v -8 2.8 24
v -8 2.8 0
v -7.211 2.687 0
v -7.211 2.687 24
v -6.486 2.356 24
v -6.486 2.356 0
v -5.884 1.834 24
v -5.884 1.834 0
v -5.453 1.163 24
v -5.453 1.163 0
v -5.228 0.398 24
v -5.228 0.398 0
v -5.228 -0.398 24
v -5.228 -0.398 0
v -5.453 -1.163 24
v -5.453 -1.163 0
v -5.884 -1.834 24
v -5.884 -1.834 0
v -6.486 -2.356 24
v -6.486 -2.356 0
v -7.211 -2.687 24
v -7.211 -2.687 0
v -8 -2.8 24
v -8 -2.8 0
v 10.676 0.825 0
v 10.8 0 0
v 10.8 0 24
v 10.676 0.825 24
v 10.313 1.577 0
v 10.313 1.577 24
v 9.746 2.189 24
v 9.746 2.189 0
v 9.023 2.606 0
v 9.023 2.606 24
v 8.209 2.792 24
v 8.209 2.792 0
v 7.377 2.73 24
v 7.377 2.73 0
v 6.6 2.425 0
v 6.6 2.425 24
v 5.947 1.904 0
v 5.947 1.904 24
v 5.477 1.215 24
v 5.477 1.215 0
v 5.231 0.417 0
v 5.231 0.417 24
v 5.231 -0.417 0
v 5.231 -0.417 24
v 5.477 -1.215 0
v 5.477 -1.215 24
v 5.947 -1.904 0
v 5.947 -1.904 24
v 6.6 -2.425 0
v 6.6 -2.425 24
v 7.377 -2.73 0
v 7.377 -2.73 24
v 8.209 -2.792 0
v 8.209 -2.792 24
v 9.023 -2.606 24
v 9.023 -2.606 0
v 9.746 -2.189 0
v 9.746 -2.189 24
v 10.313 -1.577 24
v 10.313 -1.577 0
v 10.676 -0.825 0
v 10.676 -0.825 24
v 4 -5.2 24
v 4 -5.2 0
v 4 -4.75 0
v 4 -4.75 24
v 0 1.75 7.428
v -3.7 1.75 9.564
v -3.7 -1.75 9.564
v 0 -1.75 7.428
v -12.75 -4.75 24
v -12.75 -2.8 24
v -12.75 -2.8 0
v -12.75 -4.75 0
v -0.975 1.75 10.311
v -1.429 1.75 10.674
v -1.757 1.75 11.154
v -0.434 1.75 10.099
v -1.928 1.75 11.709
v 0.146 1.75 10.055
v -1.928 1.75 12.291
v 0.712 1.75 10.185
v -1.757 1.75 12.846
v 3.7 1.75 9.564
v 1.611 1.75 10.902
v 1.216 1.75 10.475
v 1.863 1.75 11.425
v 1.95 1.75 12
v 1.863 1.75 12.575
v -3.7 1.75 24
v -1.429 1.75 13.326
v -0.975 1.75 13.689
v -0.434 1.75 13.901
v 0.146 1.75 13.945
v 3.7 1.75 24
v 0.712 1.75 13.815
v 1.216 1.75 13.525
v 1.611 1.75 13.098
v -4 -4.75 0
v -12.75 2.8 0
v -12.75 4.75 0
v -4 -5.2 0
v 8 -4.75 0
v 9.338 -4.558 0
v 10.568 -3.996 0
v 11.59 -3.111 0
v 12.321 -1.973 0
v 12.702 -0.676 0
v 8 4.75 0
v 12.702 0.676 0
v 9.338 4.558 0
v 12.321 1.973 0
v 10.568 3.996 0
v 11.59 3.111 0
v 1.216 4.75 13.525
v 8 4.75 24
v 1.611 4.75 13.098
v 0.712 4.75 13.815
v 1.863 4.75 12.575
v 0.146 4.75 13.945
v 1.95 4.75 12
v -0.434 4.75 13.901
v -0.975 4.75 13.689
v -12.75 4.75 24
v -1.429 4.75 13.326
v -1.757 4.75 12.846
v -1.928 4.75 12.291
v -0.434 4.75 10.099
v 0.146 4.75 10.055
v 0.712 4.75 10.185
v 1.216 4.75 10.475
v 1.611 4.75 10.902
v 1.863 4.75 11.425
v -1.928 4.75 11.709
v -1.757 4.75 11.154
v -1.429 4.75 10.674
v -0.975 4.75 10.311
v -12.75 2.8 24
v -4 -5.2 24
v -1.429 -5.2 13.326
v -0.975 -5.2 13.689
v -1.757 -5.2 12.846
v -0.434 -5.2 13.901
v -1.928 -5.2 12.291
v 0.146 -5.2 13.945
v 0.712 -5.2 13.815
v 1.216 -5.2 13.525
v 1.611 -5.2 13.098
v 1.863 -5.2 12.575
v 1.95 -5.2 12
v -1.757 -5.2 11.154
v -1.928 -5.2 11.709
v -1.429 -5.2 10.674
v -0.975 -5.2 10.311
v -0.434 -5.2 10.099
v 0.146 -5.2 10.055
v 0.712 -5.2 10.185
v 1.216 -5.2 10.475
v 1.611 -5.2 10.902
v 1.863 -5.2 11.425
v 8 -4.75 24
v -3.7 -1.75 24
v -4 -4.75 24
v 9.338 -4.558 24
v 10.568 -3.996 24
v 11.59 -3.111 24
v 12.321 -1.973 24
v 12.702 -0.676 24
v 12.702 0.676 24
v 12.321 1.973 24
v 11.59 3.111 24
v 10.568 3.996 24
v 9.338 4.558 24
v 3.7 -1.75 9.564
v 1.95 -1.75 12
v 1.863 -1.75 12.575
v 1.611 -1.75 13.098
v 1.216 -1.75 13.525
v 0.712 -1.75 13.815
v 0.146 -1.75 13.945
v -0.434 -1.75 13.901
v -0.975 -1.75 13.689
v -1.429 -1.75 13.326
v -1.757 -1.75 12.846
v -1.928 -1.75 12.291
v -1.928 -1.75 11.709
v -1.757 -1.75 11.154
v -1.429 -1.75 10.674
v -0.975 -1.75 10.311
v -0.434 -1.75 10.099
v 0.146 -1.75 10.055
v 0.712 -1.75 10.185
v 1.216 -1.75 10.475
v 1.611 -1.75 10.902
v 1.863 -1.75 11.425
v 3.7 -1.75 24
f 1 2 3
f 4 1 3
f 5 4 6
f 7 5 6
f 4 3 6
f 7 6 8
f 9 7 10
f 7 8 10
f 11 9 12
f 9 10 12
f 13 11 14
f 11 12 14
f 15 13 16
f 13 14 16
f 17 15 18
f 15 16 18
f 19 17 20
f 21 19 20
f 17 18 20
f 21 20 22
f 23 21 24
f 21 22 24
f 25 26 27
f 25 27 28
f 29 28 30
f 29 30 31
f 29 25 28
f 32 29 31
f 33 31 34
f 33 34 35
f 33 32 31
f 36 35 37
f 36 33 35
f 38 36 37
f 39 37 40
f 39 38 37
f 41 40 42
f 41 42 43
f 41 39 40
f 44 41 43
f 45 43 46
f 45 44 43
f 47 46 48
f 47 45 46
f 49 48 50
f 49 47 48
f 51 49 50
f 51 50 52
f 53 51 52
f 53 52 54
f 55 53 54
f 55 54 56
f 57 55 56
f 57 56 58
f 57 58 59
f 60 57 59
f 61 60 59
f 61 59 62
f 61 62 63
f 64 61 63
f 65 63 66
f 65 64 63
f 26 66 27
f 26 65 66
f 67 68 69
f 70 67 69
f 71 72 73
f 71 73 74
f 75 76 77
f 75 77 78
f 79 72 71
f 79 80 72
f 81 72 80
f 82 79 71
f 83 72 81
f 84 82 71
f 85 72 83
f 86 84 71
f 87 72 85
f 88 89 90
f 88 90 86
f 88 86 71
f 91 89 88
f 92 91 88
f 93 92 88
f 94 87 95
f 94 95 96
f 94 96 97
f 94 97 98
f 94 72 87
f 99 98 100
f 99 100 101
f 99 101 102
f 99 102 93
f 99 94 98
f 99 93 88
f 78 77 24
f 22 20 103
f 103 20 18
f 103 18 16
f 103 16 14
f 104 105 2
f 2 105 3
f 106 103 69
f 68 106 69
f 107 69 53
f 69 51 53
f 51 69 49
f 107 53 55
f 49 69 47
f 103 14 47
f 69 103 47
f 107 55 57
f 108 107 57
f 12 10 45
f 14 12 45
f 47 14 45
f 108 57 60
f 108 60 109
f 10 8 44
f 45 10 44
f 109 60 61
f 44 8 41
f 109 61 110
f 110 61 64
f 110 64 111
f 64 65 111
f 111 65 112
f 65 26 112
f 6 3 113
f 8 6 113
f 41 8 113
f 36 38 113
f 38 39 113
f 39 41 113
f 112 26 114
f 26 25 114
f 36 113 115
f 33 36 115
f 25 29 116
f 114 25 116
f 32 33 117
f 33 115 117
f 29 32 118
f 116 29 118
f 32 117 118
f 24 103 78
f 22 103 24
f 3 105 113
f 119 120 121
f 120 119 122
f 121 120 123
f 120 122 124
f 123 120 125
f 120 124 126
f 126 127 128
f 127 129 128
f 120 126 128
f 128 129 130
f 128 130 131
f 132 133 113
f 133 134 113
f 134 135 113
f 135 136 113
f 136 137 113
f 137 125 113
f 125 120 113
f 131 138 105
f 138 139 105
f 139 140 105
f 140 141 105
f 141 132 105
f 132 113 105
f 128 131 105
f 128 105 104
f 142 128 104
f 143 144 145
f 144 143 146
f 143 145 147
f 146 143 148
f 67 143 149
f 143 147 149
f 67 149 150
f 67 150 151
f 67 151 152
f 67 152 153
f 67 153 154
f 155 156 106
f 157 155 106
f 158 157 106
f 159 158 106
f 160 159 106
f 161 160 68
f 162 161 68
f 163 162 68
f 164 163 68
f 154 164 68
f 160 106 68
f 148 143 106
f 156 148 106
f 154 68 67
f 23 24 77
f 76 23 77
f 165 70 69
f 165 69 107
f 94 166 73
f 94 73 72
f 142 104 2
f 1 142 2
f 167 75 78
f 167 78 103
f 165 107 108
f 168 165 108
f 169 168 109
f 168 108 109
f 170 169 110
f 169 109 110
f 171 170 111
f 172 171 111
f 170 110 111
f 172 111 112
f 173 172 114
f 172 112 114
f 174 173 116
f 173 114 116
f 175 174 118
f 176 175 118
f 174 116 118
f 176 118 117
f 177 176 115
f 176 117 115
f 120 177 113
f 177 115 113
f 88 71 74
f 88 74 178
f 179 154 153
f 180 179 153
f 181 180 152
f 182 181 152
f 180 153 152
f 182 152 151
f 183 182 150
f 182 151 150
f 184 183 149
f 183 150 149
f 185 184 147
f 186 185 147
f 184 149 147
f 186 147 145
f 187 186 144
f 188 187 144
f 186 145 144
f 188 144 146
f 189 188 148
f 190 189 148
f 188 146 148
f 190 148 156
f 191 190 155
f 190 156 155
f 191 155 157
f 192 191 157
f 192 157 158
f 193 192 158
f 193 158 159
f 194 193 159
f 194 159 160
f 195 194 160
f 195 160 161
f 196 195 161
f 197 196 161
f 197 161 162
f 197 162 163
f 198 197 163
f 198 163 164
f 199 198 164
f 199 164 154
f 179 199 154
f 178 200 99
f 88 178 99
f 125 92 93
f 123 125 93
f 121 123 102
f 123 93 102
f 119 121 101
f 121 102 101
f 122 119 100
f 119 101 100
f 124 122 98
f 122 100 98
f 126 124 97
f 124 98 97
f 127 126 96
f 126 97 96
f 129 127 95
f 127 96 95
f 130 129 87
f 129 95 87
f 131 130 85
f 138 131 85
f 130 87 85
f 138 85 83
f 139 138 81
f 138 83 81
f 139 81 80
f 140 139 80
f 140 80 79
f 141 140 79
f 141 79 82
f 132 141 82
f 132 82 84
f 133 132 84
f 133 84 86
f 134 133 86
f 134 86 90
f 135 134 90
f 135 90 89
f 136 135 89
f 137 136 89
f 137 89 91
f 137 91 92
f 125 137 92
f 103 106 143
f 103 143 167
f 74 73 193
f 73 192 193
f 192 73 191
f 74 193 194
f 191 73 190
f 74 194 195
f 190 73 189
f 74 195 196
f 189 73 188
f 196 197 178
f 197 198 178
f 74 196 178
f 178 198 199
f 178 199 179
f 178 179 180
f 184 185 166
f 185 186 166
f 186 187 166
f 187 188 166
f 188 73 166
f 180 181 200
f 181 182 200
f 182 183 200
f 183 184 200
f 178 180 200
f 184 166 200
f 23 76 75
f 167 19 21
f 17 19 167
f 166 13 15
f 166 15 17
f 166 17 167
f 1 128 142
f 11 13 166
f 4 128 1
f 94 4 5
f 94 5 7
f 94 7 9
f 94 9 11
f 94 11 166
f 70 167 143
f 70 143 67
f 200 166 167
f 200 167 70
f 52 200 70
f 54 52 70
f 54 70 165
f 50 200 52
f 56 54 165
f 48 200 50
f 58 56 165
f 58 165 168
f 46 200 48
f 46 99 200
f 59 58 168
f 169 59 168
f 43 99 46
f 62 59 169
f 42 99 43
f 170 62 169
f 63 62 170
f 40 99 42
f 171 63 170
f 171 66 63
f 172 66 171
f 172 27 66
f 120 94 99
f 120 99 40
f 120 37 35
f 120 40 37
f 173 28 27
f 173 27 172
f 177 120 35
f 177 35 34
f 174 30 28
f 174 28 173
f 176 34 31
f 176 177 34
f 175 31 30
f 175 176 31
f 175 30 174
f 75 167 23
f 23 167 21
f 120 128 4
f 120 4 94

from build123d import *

# Parameters (mm, degrees)
F0_R     = 2.8
F0_W     = 8
F0_H     = 0.45
F1_DEPTH = 24
F2_R     = 1.95
F3_DEPTH = 9.951
F4_W     = 7.4
F4_H     = 3.5
F5_DEPTH = 12
F7_DEPTH = 3.5


# Not quite as in the source:
# - a feature names something its author has since deleted; it is built from what else it names


with BuildPart() as f1:
    # F0 (on Top) → F1 (new body)
    with BuildSketch(Plane.XY):
        with BuildLine():
            ThreePointArc((-8, 2.8), (-5.2, 0), (-8, -2.8))
            Line((-8, -2.8), (-12.75, -2.8))
            Line((-12.75, -2.8), (-12.75, -4.75))
            Line((-12.75, -4.75), (-8, -4.75))
            Line((-8, -4.75), (-4, -4.75))
            Line((-4, -4.75), (-4, -4.3))
            Line((-4, -4.3), (4, -4.3))
            Line((4, -4.3), (4, -4.75))
            Line((4, -4.75), (8, -4.75))
            ThreePointArc((8, -4.75), (12.75, 0), (8, 4.75))
            Line((8, 4.75), (-8, 4.75))
            Line((-8, 4.75), (-12.75, 4.75))
            Line((-12.75, 4.75), (-12.75, 2.8))
            Line((-12.75, 2.8), (-8, 2.8))
        make_face()
        with Locations((8, 0)):
            Circle(F0_R, mode=Mode.SUBTRACT)
        with Locations((0, -4.525)):
            Rectangle(F0_W, F0_H)
        with Locations((0, -4.975)):
            Rectangle(F0_W, F0_H)
    extrude(amount=F1_DEPTH)

    # F2 (on face) → F3 (cut, through all)
    with BuildSketch(Plane.XZ.offset(5.2)):
        with Locations((0, 12)):
            Circle(F2_R)
    extrude(amount=-F3_DEPTH, mode=Mode.SUBTRACT)

    # F4 (on face) → F5 (cut)
    with BuildSketch(Plane.XY.offset(24)):
        Rectangle(F4_W, F4_H)
    extrude(amount=-F5_DEPTH, mode=Mode.SUBTRACT)

    # F6 (on face) → F7 (cut, through all)
    with BuildSketch(Plane.XZ.offset(-1.75)):
        Polygon((3.7, 9.563804004), (3.7, 13.836195996), (0, 15.972391992), (-3.7, 13.836195996), (-3.7, 9.563804004), (0, 7.427608008), align=None)
    extrude(amount=F7_DEPTH, mode=Mode.SUBTRACT)


solid = f1.part
